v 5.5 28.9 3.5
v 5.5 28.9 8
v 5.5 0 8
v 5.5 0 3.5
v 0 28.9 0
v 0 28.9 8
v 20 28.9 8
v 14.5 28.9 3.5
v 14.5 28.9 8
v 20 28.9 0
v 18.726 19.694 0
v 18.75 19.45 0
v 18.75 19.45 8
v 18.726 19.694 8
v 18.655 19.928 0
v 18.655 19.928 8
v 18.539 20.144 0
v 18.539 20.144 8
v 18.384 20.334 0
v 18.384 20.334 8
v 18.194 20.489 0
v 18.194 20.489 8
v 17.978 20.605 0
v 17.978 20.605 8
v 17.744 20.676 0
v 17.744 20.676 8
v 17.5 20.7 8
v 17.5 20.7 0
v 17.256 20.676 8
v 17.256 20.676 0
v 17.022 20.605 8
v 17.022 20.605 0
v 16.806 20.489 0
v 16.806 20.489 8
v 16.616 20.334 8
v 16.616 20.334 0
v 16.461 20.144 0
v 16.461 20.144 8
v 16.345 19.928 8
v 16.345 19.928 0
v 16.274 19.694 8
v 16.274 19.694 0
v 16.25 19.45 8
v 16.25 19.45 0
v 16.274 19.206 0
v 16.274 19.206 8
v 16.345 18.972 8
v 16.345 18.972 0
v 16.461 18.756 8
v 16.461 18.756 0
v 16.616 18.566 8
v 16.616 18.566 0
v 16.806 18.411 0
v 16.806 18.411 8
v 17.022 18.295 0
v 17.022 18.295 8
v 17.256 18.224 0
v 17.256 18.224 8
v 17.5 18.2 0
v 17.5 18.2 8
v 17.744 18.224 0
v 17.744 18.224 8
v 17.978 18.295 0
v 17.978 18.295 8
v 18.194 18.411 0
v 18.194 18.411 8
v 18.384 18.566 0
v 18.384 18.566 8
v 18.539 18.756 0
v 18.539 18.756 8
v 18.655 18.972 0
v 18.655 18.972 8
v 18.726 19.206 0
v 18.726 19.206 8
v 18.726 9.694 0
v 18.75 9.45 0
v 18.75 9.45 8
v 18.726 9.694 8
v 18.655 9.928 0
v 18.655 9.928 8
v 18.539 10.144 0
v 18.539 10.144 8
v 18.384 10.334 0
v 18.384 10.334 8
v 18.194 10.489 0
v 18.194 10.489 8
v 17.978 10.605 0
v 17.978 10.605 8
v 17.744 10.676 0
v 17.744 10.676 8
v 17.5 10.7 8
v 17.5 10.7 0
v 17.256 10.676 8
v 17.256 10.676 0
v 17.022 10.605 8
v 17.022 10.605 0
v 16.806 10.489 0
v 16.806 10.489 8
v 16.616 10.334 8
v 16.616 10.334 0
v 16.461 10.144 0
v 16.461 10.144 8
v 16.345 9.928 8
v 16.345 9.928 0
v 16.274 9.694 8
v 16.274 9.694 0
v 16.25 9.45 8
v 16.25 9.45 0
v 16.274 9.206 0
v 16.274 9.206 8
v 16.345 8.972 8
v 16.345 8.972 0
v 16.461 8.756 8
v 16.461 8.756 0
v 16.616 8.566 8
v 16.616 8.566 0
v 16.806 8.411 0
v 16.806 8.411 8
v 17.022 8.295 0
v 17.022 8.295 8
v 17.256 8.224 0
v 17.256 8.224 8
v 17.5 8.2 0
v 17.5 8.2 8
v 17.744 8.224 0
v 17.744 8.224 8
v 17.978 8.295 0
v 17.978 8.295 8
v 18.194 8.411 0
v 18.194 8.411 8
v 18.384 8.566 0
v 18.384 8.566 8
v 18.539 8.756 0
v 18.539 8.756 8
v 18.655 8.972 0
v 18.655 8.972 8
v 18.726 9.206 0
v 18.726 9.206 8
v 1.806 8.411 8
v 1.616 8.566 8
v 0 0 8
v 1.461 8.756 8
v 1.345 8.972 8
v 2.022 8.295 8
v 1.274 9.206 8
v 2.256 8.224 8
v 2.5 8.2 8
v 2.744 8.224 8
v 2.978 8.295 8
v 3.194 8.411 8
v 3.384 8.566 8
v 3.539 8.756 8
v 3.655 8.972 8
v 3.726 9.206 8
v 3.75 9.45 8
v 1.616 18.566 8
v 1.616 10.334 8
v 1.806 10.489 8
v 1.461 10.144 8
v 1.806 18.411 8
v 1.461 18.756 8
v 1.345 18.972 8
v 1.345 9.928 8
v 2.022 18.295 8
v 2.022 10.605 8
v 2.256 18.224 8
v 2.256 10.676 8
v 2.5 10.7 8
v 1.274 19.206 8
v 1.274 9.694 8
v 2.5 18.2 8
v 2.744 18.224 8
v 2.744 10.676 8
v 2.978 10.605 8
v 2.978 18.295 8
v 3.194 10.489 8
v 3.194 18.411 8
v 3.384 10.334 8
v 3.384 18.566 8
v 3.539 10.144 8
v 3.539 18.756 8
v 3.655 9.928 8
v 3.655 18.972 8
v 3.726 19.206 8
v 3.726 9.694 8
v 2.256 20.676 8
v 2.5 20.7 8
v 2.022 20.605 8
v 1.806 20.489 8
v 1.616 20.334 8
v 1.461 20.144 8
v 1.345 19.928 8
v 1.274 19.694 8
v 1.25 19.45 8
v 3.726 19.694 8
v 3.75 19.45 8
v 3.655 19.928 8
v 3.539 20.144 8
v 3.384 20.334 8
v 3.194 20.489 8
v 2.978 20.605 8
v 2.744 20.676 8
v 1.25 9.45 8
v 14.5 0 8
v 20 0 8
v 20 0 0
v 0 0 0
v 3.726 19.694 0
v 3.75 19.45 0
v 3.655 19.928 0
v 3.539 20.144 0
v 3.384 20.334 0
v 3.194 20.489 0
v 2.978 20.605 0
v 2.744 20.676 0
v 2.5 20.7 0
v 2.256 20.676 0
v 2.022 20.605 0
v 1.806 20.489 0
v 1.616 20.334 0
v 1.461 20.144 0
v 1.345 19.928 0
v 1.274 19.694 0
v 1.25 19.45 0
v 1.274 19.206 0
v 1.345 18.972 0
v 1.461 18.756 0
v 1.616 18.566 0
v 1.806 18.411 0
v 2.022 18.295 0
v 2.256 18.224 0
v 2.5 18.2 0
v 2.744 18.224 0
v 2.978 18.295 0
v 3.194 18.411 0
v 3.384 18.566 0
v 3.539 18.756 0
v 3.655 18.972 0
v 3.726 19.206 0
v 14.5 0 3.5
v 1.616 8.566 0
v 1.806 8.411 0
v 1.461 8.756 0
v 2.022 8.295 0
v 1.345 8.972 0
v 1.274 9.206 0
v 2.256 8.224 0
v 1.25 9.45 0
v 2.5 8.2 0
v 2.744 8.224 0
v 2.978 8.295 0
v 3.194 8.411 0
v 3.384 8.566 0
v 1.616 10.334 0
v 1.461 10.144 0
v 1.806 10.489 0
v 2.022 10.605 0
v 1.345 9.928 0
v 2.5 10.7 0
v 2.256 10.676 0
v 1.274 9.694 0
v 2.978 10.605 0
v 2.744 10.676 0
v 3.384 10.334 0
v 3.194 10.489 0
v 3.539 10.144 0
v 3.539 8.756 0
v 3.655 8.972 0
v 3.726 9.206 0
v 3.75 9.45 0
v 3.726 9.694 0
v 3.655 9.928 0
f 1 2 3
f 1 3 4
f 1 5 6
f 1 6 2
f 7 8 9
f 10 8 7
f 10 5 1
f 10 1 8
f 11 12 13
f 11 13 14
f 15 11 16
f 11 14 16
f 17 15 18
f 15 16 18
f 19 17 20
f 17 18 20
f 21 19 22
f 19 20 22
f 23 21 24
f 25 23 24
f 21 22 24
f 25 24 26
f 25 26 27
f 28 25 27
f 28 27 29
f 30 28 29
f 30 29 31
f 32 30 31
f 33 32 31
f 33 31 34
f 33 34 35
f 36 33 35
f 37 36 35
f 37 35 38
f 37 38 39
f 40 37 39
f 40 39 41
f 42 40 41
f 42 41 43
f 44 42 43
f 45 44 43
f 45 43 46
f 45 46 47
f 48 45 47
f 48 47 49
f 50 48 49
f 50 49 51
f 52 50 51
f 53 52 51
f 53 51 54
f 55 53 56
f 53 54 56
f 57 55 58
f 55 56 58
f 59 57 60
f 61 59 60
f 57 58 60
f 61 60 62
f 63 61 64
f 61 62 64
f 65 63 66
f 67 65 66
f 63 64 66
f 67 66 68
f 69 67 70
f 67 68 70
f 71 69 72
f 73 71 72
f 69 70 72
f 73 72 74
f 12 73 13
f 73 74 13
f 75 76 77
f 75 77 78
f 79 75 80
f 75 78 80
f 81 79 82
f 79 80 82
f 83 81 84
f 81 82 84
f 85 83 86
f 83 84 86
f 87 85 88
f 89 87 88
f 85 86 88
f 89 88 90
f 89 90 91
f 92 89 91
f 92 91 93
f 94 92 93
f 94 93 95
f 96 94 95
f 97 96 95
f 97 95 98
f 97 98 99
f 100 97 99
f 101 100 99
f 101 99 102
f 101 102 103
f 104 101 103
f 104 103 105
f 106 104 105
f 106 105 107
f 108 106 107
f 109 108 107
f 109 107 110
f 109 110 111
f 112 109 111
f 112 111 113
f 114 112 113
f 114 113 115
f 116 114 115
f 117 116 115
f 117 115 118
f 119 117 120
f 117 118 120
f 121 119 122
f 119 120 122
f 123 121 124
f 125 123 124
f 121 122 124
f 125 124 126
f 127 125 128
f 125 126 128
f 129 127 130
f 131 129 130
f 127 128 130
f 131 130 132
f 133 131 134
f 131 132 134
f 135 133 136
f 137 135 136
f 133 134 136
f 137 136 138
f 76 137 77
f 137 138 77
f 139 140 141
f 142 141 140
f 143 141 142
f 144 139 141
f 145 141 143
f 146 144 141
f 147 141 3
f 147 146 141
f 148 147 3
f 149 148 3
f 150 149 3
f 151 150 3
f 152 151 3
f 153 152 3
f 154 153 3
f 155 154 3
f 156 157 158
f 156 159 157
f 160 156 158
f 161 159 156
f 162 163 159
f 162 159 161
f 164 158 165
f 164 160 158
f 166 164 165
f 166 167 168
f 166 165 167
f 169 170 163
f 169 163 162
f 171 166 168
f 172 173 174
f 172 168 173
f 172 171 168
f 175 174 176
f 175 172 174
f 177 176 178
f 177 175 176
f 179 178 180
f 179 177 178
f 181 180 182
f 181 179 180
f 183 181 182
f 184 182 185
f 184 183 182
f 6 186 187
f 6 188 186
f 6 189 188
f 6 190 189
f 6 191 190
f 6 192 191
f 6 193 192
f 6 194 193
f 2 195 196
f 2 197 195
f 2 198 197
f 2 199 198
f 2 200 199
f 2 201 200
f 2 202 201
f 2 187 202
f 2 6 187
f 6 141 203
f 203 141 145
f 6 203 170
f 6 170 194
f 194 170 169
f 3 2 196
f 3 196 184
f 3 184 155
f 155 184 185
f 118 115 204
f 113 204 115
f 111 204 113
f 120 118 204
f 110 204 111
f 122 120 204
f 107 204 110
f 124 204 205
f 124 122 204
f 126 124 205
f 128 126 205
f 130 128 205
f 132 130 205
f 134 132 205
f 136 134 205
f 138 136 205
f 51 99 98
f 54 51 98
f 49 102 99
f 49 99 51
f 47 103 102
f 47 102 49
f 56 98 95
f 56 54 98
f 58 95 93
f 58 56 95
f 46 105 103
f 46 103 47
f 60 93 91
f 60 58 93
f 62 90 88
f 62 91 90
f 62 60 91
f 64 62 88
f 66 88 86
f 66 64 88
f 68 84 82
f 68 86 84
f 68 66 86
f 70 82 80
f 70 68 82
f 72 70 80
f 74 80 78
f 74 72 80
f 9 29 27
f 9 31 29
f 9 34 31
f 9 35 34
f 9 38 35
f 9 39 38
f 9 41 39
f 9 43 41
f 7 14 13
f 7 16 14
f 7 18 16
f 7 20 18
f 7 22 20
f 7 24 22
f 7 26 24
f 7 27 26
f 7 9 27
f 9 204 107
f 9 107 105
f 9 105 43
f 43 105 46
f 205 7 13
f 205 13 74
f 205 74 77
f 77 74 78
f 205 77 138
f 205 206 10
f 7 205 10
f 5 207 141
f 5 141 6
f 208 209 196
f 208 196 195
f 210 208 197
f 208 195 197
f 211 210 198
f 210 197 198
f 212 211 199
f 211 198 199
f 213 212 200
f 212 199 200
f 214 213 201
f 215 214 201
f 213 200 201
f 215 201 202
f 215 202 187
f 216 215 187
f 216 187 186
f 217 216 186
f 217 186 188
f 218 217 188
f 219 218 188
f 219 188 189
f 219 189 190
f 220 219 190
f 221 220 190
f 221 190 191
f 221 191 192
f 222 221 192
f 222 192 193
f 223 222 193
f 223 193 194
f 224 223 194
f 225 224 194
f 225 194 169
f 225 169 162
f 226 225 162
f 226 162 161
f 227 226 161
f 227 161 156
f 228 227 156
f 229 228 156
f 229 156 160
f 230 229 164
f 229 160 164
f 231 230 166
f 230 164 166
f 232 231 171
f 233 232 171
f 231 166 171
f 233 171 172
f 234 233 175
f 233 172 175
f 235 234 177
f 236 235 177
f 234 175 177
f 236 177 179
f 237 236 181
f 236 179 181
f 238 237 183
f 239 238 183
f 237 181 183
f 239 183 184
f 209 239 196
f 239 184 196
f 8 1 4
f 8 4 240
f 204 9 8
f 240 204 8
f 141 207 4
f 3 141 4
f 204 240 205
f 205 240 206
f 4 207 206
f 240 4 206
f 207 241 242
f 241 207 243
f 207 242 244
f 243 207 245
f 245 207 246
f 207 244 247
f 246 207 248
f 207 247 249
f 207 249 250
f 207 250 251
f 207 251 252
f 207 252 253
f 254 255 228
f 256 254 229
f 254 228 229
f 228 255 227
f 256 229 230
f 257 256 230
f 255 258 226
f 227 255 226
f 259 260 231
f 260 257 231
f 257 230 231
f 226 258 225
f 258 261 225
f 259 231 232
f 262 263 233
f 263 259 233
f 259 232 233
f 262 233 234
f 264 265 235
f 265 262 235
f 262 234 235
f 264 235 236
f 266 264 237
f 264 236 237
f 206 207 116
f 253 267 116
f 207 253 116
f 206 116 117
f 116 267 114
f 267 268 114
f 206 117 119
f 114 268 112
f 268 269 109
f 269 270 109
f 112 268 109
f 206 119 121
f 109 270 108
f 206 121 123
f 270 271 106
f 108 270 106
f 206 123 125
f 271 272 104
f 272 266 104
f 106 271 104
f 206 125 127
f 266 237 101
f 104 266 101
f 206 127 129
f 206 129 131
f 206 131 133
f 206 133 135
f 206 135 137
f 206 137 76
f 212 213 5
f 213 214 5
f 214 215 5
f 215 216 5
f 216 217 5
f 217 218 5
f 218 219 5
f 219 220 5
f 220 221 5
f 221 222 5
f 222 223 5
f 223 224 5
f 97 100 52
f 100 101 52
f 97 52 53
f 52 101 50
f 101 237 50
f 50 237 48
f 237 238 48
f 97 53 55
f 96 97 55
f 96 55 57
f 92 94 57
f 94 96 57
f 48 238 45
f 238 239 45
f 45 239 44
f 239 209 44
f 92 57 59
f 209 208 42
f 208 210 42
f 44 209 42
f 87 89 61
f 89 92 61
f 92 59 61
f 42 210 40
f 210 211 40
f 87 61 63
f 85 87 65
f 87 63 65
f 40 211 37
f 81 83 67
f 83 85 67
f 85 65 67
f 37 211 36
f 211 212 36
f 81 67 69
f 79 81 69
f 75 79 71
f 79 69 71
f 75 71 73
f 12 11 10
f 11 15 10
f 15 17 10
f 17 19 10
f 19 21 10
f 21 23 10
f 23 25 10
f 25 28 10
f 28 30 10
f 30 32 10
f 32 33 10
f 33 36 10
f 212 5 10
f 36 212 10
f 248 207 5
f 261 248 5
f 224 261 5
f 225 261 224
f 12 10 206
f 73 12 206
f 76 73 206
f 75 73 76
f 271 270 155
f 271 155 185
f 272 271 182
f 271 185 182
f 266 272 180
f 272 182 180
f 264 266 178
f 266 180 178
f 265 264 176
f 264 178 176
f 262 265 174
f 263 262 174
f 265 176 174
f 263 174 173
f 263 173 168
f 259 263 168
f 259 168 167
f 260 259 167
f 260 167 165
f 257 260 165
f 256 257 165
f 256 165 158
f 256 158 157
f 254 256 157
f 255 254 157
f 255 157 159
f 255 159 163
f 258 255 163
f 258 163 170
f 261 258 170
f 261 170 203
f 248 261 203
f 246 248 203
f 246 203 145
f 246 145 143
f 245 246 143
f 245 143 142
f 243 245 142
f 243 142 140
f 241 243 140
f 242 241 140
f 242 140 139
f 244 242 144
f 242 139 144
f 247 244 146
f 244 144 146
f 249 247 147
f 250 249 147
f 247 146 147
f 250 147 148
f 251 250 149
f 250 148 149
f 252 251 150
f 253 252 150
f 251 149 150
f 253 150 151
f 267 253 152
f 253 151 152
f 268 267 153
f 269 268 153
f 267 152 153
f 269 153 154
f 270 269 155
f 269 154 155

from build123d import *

# Parameters (mm, degrees)
SKETCH_1_W             = 20
SKETCH_1_H             = 28.9
EXTRUDE_1_DEPTH        = 8
SKETCH_2_W             = 9
SKETCH_2_H             = 4.5
CUT_EXTRUDE_1_DEPTH    = 29.9
HOLE_WIZARD_M3_1_D     = 2.5
HOLE_WIZARD_M3_1_DEPTH = 10.1
HOLE_WIZARD_M3_1_TIP   = 0.751075774


with BuildPart() as part:
    # 草图1 → 凸台-拉伸1 (new body)
    with BuildSketch(Plane.XY):
        with Locations((10, 14.45)):
            Rectangle(SKETCH_1_W, SKETCH_1_H)
    extrude(amount=EXTRUDE_1_DEPTH)

    # 草图2 → 切除-拉伸1 (cut, through all)
    with BuildSketch(Plane(origin=(0, 28.9, 0), x_dir=(1, 0, 0), z_dir=(0, 1, 0))):
        with Locations((10, -5.75)):
            Rectangle(SKETCH_2_W, SKETCH_2_H)
    extrude(amount=-CUT_EXTRUDE_1_DEPTH, mode=Mode.SUBTRACT)

    # M3 螺纹孔1
    with Locations(Plane(origin=(0, 0, 0), x_dir=(-1, 0, 0), z_dir=(0, 0, -1))):
        with Locations((-2.5, 9.45), (-17.5, 9.45), (-2.5, 19.45), (-17.5, 19.45)):
            Hole(HOLE_WIZARD_M3_1_D / 2, depth=HOLE_WIZARD_M3_1_DEPTH)
            with Locations((0, 0, -(HOLE_WIZARD_M3_1_DEPTH + HOLE_WIZARD_M3_1_TIP / 2))):  # 118° drill point
                Cone(0, HOLE_WIZARD_M3_1_D / 2, HOLE_WIZARD_M3_1_TIP, mode=Mode.SUBTRACT)


solid = part.part
